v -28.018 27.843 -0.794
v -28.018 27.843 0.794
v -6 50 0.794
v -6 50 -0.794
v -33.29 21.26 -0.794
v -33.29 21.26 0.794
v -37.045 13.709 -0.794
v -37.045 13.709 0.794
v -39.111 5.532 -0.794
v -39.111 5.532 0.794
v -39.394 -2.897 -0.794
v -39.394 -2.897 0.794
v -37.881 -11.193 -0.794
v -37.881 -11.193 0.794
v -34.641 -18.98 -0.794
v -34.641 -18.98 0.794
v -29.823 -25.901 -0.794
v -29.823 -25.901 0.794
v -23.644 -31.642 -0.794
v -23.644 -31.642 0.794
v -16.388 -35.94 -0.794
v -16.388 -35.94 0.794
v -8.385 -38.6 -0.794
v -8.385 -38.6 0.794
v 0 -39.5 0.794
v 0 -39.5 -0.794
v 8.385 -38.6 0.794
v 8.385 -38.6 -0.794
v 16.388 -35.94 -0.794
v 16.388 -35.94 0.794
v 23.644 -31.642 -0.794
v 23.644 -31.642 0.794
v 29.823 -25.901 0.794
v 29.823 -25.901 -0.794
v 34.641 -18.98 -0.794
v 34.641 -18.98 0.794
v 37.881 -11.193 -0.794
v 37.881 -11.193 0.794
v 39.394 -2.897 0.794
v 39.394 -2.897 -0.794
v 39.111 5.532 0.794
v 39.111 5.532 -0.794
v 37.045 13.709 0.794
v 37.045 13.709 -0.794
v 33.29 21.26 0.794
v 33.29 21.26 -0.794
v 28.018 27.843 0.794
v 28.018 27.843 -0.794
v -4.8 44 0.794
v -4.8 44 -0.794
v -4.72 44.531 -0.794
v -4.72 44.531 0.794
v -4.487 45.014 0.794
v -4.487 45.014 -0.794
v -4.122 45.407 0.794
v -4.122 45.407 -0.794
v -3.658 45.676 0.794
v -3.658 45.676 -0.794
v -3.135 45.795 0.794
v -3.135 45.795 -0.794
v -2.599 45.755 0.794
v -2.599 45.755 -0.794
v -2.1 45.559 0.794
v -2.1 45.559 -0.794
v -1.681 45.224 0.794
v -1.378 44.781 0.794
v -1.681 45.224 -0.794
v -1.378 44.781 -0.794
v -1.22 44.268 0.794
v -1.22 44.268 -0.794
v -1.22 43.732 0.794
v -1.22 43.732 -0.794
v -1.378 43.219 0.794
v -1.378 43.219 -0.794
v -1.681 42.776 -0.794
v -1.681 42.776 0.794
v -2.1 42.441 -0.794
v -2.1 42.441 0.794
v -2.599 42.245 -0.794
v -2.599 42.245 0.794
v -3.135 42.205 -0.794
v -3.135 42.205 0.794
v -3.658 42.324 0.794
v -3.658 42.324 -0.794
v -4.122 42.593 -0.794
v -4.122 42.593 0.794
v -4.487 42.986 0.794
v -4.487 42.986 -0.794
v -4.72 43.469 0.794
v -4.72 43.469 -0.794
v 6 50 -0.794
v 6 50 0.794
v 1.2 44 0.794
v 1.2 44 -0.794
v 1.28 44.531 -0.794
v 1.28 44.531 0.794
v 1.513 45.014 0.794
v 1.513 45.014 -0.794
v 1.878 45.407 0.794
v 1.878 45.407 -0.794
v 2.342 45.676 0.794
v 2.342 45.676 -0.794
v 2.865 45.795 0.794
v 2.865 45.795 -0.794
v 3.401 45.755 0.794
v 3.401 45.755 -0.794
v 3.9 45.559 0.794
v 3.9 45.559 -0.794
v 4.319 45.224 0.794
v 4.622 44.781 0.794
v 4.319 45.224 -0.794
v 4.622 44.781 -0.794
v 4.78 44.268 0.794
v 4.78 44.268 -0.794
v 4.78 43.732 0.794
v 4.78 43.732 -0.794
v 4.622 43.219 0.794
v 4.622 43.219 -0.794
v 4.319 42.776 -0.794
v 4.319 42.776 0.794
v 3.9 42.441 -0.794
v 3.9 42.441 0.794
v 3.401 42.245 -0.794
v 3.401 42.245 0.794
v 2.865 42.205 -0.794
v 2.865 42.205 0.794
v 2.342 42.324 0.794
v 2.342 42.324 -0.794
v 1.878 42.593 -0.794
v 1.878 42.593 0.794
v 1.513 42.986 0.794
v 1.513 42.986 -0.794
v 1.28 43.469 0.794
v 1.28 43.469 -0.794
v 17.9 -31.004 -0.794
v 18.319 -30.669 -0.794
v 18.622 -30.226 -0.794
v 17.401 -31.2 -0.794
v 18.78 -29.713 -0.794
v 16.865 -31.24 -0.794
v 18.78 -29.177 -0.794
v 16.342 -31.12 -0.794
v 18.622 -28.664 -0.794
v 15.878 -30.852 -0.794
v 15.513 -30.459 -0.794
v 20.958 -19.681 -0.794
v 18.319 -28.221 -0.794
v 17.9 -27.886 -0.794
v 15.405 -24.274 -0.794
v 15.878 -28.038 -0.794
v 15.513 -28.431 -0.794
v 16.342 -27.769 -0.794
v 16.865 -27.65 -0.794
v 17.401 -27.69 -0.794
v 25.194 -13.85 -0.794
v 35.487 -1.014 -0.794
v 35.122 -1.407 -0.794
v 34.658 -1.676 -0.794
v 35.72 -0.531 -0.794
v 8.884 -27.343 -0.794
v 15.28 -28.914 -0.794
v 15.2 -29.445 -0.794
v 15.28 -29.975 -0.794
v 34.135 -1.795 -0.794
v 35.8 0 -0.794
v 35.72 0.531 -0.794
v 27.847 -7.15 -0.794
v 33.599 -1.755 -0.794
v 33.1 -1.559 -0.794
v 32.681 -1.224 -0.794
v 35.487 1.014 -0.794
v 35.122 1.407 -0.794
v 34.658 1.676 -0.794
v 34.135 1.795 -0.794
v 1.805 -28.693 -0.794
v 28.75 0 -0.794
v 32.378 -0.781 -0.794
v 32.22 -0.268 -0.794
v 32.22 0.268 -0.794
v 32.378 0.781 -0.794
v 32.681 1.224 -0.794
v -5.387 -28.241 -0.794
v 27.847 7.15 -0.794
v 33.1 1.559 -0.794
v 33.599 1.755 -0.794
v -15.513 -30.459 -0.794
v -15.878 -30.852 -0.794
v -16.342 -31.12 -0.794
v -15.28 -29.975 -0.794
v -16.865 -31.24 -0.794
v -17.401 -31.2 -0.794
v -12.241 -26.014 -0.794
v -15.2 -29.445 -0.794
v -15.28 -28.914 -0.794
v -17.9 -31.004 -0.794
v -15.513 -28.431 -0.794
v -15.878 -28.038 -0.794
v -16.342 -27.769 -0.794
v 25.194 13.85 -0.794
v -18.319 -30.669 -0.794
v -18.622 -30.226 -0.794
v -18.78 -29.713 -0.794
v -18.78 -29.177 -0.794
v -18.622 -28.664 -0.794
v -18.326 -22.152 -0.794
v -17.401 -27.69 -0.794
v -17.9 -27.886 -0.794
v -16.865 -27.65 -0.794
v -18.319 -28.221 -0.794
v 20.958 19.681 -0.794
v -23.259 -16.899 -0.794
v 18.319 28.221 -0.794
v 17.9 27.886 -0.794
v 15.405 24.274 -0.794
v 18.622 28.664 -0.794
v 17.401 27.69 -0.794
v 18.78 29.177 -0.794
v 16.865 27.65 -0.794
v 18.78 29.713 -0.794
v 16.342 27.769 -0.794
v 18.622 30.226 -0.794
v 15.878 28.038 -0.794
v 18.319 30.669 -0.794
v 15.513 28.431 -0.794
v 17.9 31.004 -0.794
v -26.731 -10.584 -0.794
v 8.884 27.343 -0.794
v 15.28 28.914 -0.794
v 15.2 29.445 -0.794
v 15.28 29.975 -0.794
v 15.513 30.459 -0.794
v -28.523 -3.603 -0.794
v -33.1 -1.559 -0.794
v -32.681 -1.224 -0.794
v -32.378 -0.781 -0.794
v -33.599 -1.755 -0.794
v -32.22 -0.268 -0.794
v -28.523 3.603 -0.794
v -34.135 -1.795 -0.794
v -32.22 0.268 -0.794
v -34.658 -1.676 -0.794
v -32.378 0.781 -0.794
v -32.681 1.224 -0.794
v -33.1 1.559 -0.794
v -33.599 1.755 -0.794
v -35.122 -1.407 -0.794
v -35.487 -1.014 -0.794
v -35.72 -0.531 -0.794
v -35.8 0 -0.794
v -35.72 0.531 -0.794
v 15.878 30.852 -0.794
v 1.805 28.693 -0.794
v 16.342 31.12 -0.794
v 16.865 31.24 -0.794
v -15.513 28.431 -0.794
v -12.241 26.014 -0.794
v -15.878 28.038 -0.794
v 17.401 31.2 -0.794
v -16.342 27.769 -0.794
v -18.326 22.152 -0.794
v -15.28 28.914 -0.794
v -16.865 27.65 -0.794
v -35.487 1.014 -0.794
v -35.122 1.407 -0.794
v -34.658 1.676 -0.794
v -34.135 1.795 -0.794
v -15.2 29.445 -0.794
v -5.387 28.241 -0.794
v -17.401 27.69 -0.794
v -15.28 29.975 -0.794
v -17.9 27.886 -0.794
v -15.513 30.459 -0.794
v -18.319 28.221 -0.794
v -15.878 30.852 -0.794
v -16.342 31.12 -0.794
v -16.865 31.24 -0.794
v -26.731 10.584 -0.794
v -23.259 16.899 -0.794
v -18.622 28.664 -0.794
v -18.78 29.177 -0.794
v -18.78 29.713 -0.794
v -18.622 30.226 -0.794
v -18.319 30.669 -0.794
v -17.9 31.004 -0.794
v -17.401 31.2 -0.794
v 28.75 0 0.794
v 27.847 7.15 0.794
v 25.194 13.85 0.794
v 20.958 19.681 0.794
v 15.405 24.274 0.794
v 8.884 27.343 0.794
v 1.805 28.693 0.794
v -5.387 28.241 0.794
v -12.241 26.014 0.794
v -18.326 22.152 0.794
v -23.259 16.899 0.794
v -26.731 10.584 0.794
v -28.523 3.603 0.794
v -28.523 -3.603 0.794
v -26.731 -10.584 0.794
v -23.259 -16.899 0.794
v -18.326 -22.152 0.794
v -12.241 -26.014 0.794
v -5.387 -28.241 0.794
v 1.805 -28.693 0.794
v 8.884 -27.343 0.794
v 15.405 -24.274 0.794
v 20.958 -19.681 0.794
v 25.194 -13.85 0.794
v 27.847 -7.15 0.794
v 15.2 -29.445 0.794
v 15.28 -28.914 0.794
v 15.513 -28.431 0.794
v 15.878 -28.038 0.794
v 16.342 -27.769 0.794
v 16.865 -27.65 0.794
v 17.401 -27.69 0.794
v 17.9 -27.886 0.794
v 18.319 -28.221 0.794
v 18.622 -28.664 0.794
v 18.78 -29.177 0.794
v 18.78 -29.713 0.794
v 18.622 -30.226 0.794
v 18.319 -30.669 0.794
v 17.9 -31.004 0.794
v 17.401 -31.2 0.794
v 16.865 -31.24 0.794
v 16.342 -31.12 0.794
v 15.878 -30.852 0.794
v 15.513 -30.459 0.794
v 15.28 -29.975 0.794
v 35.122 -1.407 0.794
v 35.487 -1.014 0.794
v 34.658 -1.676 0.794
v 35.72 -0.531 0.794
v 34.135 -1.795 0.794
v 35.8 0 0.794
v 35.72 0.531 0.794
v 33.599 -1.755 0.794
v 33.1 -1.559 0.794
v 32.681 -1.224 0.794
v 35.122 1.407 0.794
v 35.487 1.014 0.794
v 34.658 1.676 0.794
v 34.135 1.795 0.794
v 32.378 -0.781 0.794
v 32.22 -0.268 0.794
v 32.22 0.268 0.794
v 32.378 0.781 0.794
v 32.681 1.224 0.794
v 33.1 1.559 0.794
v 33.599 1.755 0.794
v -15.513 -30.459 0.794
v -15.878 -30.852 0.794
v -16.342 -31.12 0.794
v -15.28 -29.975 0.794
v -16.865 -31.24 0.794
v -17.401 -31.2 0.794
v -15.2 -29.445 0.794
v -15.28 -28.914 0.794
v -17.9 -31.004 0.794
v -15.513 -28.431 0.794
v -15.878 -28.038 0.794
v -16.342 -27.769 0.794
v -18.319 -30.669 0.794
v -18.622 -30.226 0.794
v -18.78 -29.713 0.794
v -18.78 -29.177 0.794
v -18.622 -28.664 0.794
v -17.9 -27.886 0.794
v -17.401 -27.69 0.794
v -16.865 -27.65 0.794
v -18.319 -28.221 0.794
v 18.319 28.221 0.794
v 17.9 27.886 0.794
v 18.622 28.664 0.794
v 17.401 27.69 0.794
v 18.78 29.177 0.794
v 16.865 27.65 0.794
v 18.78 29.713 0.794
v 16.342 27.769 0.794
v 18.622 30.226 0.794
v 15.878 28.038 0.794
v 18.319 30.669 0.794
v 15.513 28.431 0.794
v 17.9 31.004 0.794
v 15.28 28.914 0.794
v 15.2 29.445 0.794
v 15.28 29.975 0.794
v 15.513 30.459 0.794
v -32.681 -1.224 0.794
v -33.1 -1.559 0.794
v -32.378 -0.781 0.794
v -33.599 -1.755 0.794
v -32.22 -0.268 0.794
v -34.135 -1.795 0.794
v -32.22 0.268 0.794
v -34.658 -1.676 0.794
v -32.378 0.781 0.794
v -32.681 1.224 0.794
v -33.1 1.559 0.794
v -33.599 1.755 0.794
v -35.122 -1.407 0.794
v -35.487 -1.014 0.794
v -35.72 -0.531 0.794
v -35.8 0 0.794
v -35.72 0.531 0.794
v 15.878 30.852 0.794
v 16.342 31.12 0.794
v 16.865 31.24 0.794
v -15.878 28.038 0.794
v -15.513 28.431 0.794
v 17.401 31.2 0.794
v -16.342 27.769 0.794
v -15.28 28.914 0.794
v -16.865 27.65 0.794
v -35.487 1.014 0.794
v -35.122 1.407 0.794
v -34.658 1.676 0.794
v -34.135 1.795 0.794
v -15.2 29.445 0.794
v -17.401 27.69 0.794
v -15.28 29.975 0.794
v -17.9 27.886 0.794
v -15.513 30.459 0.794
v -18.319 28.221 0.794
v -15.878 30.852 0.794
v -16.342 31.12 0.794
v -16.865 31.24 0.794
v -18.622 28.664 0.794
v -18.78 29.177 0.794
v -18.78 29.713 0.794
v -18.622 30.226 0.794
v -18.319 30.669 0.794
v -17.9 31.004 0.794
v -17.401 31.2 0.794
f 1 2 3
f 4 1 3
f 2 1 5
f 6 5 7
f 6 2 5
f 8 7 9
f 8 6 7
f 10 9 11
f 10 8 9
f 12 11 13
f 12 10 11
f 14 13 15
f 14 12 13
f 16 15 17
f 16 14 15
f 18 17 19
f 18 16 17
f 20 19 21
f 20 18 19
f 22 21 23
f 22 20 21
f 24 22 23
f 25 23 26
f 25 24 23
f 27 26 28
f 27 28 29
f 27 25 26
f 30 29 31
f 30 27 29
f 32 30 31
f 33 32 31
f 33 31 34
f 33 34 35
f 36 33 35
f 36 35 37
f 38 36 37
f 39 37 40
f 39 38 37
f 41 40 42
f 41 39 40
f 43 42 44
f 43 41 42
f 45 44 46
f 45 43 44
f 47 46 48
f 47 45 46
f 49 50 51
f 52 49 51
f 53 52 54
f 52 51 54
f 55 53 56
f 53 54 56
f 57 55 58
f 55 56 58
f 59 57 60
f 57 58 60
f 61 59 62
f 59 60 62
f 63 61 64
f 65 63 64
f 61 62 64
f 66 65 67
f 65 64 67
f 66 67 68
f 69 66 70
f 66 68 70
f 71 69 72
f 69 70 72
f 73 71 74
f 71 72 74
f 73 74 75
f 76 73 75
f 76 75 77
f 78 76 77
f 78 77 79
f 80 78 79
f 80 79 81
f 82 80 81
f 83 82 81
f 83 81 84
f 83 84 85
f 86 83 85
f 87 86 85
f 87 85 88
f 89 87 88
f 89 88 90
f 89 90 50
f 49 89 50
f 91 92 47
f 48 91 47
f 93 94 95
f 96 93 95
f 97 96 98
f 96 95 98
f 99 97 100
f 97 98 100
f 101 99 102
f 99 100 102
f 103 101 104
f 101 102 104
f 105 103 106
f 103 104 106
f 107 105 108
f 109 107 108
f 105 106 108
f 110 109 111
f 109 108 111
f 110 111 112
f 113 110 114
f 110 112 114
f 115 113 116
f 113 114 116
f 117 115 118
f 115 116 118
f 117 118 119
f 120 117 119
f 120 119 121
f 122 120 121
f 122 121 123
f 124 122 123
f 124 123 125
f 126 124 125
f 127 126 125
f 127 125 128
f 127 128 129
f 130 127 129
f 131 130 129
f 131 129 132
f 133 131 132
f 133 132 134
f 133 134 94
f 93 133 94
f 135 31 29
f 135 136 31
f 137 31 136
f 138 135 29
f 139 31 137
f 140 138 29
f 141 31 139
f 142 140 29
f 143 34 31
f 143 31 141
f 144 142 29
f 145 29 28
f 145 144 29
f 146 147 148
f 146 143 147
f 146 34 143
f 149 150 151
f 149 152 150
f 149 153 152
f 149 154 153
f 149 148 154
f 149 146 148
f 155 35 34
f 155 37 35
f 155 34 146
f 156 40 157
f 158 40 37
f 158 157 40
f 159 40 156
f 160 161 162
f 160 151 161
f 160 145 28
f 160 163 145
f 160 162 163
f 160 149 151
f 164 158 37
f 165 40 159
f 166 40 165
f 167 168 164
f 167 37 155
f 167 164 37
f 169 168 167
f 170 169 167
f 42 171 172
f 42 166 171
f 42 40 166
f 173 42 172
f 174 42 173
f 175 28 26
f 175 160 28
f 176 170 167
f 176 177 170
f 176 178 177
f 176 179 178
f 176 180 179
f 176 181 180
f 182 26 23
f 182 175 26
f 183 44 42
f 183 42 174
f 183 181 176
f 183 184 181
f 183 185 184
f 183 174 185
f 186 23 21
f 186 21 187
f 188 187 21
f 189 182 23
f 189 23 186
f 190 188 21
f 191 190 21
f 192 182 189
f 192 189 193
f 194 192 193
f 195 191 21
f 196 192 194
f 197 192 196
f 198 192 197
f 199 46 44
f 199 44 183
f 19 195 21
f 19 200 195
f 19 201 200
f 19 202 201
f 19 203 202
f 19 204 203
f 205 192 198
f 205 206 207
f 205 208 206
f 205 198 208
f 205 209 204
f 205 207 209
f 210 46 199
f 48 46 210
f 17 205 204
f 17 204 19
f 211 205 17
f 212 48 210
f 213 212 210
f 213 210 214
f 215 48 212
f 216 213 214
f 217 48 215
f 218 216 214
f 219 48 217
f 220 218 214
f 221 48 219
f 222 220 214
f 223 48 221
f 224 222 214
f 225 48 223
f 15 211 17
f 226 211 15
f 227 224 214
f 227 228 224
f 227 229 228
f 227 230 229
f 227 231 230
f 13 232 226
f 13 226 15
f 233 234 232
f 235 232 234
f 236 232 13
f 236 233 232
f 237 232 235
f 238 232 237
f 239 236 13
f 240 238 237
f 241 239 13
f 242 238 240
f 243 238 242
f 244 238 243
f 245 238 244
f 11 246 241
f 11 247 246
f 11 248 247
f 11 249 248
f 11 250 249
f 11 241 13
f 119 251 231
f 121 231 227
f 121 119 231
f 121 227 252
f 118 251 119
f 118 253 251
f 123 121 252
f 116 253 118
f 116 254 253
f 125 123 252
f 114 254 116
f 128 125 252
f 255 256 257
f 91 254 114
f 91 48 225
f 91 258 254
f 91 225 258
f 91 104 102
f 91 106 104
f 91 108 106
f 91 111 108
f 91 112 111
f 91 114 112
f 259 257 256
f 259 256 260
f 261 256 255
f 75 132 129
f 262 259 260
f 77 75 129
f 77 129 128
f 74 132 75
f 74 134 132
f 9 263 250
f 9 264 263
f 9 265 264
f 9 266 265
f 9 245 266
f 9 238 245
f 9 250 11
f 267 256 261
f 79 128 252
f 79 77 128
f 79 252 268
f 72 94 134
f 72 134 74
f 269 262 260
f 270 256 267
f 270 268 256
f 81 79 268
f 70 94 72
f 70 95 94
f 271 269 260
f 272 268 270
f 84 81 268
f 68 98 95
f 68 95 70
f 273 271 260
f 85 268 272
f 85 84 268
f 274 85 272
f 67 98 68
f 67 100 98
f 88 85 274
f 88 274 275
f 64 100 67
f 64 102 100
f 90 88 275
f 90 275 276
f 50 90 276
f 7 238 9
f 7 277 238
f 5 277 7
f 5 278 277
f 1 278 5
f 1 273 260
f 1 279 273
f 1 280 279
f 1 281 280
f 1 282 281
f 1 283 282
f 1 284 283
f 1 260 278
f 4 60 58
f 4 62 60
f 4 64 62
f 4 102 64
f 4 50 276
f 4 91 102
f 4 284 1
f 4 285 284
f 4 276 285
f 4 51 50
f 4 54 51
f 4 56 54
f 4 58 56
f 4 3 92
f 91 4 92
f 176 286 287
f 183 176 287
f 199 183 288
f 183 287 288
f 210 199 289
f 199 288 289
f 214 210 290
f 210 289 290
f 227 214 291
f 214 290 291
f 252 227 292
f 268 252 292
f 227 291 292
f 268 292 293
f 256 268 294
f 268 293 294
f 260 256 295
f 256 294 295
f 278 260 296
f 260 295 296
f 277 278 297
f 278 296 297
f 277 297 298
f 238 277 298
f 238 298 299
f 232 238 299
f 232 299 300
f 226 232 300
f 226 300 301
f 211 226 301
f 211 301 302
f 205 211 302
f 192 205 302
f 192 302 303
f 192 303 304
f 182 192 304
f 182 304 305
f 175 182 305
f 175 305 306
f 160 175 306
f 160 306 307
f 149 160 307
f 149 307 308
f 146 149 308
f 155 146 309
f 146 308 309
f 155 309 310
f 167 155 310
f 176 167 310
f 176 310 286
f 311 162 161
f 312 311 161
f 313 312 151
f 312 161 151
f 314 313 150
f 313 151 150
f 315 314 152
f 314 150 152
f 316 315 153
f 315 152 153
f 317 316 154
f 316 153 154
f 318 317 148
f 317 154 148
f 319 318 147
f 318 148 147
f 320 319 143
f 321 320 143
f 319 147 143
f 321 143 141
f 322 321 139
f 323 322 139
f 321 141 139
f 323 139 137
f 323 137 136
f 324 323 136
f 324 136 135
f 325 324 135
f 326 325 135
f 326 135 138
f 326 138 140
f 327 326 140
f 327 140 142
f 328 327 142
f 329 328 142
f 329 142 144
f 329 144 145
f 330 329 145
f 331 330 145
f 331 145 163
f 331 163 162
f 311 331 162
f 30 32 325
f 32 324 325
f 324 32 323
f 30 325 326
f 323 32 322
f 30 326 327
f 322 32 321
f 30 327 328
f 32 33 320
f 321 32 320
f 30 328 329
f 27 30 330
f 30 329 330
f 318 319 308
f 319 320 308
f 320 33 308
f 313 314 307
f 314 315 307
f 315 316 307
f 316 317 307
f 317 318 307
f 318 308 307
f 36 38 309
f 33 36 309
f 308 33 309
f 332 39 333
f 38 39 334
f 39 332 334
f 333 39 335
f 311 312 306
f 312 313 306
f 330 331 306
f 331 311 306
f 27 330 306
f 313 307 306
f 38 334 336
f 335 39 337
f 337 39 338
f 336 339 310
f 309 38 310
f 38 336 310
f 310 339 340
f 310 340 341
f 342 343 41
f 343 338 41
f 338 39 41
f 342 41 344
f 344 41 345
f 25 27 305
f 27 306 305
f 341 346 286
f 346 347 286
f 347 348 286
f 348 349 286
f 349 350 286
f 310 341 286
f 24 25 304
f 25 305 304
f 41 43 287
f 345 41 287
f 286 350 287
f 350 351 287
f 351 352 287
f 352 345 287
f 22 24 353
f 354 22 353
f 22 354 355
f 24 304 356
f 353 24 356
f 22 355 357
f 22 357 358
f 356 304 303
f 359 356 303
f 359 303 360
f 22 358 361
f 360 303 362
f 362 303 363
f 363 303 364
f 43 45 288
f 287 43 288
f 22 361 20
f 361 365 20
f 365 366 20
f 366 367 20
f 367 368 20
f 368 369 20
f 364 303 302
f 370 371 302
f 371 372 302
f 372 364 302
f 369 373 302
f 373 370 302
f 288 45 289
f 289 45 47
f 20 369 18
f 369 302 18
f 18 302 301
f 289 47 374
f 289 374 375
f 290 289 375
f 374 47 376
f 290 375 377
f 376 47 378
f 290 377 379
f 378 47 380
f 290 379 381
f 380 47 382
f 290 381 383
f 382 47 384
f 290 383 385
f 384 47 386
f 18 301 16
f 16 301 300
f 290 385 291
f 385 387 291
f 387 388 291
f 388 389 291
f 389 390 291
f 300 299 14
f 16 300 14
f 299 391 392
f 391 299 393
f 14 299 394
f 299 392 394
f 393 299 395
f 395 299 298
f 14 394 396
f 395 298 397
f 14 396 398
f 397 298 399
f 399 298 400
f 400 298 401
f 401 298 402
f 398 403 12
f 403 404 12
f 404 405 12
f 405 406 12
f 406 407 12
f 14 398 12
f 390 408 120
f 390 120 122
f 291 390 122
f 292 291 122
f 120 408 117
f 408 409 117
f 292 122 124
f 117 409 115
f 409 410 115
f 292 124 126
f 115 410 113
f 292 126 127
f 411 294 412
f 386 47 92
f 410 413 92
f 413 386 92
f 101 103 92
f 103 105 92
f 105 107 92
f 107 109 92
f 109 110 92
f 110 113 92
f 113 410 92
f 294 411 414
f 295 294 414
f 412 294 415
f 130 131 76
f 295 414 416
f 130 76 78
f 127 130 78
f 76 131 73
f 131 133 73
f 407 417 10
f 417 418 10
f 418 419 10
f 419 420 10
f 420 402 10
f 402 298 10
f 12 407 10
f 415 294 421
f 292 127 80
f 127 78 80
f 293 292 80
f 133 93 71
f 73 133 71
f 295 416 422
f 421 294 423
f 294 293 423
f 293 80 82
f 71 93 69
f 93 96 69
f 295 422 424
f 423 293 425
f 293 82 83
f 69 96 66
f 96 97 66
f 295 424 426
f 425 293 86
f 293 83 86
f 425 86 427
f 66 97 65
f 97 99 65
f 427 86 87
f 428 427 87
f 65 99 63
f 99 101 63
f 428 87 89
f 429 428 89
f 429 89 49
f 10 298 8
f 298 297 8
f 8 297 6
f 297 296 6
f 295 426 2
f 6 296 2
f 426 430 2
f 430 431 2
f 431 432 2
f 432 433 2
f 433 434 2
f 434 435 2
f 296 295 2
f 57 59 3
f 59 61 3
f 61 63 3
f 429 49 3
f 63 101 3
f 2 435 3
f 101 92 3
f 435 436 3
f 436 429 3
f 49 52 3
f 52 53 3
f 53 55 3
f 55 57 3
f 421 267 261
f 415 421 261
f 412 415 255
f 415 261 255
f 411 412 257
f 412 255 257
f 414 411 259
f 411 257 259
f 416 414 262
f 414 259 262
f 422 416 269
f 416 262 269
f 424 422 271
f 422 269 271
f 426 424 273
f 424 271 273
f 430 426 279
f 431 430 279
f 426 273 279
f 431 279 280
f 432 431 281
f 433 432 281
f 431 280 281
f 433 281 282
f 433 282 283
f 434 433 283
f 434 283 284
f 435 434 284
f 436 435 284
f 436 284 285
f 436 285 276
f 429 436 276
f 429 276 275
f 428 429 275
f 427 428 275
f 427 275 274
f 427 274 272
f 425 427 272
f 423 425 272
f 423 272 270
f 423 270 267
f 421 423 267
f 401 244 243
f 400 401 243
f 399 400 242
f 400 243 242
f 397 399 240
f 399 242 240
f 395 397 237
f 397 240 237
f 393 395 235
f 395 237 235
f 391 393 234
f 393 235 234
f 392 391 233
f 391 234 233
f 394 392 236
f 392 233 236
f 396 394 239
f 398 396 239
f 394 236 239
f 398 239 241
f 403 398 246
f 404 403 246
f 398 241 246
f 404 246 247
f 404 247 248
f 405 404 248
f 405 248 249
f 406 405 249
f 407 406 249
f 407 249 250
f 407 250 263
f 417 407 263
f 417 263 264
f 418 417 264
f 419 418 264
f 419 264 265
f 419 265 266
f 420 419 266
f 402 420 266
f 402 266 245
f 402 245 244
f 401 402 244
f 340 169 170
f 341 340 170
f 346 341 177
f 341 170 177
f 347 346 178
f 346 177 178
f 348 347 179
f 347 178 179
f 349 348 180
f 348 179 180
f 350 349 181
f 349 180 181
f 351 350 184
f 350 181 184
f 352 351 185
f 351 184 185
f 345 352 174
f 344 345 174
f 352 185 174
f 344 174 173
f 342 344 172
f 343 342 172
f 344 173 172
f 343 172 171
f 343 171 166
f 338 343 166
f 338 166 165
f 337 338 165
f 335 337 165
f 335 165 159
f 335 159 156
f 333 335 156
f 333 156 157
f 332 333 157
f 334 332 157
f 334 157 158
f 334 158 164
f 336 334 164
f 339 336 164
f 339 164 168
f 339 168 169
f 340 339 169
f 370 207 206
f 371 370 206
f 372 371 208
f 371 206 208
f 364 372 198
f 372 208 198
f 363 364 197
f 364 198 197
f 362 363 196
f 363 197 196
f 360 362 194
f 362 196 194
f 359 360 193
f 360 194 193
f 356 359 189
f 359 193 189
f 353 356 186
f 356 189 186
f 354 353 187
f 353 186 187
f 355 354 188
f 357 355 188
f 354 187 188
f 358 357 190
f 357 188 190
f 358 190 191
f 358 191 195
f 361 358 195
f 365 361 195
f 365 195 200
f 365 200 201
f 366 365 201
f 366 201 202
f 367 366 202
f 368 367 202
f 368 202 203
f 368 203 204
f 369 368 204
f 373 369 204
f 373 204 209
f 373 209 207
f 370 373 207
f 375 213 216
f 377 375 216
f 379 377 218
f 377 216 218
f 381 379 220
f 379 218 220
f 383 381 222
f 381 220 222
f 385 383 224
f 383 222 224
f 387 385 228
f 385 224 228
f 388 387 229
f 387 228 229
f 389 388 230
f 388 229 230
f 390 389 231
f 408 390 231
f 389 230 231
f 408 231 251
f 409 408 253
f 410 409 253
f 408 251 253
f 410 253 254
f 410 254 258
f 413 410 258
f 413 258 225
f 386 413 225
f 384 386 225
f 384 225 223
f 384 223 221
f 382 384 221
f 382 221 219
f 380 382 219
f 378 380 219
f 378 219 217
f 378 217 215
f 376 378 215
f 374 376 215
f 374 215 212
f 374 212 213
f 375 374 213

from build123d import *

# Parameters (mm, degrees)
SKETCH1_R                = 39.5
BOSS_EXTRUDE1_DEPTH      = 0.79375
BOSS_EXTRUDE2_DEPTH      = 1.5875
SKETCH2_R                = 28.75
CUT_EXTRUDE1_DEPTH       = 64.739863165
M3_CLEARANCE_HOLE1_D     = 3.6
CIRPATTERN1_COUNT        = 6
M3_CLEARANCE_HOLE2_D     = 3.6
M3_CLEARANCE_HOLE2_DEPTH = 10
M3_CLEARANCE_HOLE2_TIP   = 1.081549114


with BuildPart() as part:
    # Sketch1 → Boss-Extrude1 (new, symmetric)
    with BuildSketch(Plane.XY):
        Circle(SKETCH1_R)
    extrude(amount=BOSS_EXTRUDE1_DEPTH, both=True)

    # Sketch3 → Boss-Extrude2 (add, through all)
    with BuildSketch(Plane.XY.offset(0.79375)):
        Polygon((-28.01836343, 27.842796388), (-6, 50), (6, 50), (28.01836343, 27.842796388), align=None)
    extrude(amount=-BOSS_EXTRUDE2_DEPTH)

    # Sketch2 → Cut-Extrude1 (cut, through all)
    with BuildSketch(Plane.XY.offset(0.79375)):
        Circle(SKETCH2_R)
    extrude(amount=-CUT_EXTRUDE1_DEPTH, mode=Mode.SUBTRACT)

    # M3 Clearance Hole1 (through all)
    with Locations(Plane.XY.offset(0.79375)):
        with Locations((17, -29.444863729)):
            m3_clearance_hole1 = Hole(M3_CLEARANCE_HOLE1_D / 2)

    # CirPattern1: M3 Clearance Hole1 ×6 about axis
    cirpattern1_axis = Axis((0, 0, 0), (0, 0, 1))
    for i in range(1, CIRPATTERN1_COUNT):
        add(m3_clearance_hole1.rotate(cirpattern1_axis, i * 360 / CIRPATTERN1_COUNT), mode=Mode.SUBTRACT)

    # M3 Clearance Hole2
    with Locations(Plane.XY.offset(0.79375)):
        with Locations((3, 44), (-3, 44)):
            Hole(M3_CLEARANCE_HOLE2_D / 2, depth=M3_CLEARANCE_HOLE2_DEPTH)
            with Locations((0, 0, -(M3_CLEARANCE_HOLE2_DEPTH + M3_CLEARANCE_HOLE2_TIP / 2))):  # 118° drill point
                Cone(0, M3_CLEARANCE_HOLE2_D / 2, M3_CLEARANCE_HOLE2_TIP, mode=Mode.SUBTRACT)


solid = part.part
